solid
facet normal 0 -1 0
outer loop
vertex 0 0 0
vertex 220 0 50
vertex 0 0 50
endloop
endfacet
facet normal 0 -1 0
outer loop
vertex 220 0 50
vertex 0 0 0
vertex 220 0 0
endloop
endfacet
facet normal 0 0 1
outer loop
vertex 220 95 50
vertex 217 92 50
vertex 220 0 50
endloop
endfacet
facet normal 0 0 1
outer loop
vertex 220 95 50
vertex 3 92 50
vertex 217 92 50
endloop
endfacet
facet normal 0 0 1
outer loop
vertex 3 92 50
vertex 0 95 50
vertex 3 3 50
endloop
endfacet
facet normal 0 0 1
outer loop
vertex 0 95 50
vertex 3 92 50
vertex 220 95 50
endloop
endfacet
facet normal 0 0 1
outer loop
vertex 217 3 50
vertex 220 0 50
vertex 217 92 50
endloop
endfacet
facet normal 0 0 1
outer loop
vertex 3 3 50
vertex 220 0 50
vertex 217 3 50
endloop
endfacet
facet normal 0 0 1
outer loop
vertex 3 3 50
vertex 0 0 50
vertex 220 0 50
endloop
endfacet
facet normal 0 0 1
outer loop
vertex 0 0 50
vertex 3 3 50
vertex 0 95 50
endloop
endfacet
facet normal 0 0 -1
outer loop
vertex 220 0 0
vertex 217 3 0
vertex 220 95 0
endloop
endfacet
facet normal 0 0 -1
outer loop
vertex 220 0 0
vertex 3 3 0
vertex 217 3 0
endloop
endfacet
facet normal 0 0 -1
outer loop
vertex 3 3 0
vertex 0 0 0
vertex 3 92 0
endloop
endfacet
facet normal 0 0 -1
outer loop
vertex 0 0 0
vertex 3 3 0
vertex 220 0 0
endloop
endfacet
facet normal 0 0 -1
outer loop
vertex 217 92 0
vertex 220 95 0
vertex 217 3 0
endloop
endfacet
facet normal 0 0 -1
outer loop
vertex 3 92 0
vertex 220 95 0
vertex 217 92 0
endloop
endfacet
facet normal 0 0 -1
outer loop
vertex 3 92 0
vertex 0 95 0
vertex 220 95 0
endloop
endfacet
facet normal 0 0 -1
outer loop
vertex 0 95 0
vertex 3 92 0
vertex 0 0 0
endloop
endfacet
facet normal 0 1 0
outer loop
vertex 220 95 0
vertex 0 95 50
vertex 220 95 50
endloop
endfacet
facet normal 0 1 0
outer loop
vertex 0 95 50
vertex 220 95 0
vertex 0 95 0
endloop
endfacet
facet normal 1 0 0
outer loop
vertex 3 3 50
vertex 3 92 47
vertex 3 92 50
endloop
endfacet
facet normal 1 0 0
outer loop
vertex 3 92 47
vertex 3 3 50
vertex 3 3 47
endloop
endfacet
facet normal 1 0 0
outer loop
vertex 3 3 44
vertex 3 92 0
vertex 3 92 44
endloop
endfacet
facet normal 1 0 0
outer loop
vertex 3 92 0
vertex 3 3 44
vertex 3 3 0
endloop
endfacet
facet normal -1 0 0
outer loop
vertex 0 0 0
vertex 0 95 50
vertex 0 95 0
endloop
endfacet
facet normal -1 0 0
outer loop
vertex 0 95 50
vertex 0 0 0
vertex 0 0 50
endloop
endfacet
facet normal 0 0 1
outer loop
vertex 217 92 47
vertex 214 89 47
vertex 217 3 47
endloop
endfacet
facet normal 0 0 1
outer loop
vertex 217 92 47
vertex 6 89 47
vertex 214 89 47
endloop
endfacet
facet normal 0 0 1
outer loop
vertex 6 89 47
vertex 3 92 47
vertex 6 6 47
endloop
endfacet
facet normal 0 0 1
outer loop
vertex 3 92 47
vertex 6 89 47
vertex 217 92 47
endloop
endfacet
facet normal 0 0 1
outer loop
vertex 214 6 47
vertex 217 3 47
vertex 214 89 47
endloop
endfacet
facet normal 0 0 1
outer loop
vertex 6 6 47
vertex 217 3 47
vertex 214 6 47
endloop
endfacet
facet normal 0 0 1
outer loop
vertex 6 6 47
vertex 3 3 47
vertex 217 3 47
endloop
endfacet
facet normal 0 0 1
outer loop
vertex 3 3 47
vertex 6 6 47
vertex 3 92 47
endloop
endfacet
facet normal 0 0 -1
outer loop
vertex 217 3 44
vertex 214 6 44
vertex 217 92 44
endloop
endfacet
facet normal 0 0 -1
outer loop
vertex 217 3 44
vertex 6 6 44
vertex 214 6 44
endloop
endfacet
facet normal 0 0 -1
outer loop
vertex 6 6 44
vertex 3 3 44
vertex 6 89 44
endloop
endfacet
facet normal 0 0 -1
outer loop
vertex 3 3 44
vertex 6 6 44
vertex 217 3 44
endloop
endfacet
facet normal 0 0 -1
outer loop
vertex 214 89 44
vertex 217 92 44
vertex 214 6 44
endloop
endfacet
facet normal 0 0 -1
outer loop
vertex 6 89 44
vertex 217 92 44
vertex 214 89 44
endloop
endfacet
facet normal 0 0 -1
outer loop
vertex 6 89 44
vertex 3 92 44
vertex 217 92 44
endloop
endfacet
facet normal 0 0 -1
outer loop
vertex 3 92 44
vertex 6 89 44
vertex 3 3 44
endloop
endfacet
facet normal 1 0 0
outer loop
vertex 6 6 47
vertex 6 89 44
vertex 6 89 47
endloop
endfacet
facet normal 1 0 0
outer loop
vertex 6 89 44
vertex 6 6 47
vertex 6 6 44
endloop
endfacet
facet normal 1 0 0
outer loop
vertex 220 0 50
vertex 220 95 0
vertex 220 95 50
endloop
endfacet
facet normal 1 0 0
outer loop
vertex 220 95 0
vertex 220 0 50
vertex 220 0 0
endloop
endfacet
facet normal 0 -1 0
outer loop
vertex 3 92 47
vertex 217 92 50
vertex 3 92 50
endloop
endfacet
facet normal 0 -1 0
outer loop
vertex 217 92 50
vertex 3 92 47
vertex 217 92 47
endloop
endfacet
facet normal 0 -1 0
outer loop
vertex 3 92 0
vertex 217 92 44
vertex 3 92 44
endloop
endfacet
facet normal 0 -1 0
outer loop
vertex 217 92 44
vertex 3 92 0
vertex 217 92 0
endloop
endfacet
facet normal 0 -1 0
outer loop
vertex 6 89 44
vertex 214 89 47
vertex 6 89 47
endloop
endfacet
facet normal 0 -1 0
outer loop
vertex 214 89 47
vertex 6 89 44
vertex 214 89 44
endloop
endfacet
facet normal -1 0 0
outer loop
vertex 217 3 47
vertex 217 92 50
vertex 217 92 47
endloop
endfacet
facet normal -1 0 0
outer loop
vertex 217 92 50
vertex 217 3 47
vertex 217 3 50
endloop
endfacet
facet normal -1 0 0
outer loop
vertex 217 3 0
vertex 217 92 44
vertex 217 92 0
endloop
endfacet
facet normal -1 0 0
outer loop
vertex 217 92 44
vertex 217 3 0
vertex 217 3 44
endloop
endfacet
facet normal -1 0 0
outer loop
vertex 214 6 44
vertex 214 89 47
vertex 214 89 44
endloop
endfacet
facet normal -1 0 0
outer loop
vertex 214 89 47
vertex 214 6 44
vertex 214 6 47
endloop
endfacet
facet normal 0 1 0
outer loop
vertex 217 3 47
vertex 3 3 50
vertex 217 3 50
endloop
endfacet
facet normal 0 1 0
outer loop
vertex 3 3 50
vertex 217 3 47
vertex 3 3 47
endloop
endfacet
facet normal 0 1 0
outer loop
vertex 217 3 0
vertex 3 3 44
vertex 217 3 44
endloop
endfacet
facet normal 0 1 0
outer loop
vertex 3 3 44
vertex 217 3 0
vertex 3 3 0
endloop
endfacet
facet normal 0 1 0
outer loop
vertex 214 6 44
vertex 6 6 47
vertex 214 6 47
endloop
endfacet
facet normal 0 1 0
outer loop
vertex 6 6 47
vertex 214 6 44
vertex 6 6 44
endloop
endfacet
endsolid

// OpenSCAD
module side(width, height, thickness, lip_width, lip_thickness) {
  module lip(lip_width, lip_thickness) {
    translate([0, thickness, height - thickness - lip_thickness])
      cube([width, lip_width, lip_thickness]);
  }
  cube([width, thickness, height]);
  lip(lip_width, lip_thickness);
}

module sides(width, length, height, thickness, lip_width, lip_thickness) {
  translate([0, length, 0])
    rotate([0, 0, -90])
      side(length, height, thickness, lip_width, lip_thickness);
  translate([width, length, 0])
    rotate([0, 0, 180])
      side(width, height, thickness, lip_width, lip_thickness);
  translate([width, 0, 0])
    rotate([0, 0, 90])
      side(length, height, thickness, lip_width, lip_thickness);
  translate([0, 0, 0])
    rotate([0, 0, 0])
      side(width, height, thickness, lip_width, lip_thickness);
}

// Test the component
sides(220, 95, 50, 3, 3, 3);
